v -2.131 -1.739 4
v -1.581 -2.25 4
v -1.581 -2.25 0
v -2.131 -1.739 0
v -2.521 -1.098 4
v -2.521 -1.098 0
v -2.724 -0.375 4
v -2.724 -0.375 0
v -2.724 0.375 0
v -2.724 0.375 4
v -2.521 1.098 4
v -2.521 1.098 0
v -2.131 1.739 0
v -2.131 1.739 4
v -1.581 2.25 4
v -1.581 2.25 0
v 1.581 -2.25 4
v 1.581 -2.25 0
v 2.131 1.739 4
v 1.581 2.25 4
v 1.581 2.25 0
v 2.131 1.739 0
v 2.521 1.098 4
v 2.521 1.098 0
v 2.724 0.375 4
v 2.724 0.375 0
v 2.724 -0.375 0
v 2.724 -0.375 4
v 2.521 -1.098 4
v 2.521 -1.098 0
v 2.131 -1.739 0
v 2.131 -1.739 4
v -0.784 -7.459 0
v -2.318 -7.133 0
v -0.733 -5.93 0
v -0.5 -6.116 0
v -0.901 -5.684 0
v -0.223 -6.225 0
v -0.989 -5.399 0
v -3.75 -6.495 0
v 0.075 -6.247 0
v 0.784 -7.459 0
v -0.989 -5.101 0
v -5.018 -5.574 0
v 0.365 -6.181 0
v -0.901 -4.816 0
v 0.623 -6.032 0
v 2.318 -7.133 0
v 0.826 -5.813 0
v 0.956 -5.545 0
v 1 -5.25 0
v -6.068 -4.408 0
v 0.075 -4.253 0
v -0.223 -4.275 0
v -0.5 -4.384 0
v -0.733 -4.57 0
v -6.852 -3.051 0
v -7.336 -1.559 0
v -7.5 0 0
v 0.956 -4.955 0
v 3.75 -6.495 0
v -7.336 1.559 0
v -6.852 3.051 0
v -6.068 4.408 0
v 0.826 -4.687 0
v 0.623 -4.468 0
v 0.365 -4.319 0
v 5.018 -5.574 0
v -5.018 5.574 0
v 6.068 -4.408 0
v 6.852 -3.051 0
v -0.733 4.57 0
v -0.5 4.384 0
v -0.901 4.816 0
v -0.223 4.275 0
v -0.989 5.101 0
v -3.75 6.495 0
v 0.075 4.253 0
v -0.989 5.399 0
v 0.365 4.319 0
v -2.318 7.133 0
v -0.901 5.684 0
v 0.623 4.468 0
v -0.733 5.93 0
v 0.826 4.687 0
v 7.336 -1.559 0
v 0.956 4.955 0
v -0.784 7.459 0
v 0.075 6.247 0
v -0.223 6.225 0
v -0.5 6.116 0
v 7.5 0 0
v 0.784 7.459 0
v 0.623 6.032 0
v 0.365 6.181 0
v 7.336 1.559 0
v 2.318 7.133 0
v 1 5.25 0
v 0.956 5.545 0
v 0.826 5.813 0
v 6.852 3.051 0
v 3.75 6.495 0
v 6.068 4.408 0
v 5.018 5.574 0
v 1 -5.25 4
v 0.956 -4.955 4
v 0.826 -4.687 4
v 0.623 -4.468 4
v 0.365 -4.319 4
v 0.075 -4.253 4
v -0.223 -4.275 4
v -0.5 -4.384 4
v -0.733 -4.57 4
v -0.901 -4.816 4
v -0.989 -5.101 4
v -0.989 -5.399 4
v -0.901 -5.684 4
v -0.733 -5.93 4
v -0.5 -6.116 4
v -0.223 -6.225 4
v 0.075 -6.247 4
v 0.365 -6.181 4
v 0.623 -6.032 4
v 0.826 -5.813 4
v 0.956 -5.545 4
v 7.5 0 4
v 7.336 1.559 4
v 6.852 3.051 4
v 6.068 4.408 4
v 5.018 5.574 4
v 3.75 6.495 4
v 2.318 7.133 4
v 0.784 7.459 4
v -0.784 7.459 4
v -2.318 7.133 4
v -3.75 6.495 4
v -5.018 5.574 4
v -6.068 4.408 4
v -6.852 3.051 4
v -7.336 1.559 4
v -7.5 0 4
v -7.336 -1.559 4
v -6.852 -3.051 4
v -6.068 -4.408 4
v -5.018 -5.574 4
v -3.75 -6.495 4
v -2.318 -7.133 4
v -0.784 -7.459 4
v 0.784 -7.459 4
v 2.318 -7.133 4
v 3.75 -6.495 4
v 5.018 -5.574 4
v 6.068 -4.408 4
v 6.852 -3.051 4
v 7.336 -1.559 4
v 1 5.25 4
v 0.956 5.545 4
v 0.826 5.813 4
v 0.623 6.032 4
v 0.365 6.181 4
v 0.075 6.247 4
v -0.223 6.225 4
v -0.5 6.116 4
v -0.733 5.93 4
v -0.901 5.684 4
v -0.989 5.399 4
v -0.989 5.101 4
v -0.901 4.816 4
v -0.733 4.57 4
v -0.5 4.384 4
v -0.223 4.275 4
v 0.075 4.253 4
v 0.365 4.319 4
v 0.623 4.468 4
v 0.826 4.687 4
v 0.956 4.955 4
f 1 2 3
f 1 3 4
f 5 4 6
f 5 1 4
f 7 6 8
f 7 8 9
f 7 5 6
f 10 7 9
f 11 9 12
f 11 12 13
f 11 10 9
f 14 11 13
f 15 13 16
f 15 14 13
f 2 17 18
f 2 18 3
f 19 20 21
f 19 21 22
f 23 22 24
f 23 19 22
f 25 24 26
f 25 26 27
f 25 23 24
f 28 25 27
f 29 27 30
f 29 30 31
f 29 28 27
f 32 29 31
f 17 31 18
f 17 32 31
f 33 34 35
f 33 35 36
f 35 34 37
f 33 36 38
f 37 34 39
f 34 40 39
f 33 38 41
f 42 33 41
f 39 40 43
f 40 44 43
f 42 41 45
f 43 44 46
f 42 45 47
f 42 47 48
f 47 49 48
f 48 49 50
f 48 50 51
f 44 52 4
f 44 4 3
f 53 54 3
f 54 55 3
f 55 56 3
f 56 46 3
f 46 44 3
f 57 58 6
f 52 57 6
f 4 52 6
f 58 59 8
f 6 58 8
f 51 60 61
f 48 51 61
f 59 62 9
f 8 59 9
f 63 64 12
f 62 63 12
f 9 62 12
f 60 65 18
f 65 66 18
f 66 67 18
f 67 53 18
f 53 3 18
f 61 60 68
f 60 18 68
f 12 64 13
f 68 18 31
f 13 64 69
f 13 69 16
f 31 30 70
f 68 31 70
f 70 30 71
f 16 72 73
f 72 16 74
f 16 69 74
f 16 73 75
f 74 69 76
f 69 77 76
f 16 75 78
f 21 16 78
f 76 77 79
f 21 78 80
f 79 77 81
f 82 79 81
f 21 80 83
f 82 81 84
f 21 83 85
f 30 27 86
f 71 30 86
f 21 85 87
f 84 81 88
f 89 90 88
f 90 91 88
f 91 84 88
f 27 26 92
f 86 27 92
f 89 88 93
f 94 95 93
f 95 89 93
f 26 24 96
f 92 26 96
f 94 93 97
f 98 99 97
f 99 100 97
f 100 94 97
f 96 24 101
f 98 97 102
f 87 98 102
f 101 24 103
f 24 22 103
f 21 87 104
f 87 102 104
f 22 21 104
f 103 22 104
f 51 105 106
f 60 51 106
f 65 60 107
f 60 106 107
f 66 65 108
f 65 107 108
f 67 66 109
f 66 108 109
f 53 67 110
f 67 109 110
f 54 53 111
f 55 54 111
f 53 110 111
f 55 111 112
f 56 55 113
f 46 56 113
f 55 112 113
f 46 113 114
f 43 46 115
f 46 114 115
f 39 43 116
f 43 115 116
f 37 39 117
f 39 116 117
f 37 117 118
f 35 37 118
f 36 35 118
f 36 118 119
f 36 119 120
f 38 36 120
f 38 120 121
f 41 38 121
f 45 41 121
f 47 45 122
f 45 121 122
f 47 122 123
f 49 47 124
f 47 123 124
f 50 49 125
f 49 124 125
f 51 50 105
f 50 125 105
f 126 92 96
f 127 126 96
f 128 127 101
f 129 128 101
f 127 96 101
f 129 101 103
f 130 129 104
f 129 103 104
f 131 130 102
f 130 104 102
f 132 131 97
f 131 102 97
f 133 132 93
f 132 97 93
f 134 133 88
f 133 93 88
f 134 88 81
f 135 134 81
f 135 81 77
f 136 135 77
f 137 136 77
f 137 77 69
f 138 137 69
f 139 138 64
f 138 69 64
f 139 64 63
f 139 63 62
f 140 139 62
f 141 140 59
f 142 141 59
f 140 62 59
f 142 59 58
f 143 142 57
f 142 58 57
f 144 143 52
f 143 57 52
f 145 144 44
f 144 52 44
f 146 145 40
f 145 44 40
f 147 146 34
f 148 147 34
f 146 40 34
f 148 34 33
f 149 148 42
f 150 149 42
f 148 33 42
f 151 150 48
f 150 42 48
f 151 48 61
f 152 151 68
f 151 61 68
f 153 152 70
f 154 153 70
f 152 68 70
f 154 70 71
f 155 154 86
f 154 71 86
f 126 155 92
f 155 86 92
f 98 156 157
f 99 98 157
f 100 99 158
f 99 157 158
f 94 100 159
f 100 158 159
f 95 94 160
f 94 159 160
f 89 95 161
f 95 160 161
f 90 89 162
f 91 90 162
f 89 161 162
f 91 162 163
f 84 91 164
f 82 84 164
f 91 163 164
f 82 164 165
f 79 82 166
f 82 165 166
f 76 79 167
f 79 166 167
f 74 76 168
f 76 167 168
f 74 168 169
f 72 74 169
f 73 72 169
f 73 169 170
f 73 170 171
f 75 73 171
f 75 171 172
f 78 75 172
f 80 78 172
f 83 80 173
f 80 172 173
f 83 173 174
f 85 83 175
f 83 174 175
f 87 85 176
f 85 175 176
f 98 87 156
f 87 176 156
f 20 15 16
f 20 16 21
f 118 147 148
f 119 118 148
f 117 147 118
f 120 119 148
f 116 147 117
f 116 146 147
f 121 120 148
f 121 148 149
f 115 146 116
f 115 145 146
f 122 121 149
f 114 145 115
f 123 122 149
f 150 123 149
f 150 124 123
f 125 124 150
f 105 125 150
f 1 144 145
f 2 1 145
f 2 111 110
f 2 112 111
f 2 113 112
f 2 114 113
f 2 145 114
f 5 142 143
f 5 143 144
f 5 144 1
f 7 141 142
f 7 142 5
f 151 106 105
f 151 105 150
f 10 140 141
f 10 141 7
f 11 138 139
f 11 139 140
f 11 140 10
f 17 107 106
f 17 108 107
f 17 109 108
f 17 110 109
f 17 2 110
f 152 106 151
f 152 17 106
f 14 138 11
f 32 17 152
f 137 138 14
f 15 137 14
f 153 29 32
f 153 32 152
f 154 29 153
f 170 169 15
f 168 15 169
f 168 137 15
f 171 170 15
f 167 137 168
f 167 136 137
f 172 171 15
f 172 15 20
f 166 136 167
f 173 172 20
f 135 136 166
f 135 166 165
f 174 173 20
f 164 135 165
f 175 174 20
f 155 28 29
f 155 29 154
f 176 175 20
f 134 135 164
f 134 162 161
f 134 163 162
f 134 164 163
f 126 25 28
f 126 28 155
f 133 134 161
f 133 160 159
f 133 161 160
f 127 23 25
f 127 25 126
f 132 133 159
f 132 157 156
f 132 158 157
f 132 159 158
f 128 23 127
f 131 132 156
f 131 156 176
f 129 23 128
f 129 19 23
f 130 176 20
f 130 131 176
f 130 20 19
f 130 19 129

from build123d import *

# Parameters (mm, degrees)
SKETCH_1_R          = 7.5
EXTRUDE_1_DEPTH     = 4
SKETCH_4_R          = 1
CUT_EXTRUDE_2_DEPTH = 4


with BuildPart() as part:
    # Эскиз1 → Бобышка-Вытянуть1 (new body)
    with BuildSketch(Plane.XY):
        Circle(SKETCH_1_R)
    extrude(amount=EXTRUDE_1_DEPTH)

    # Эскиз4 → Вырез-Вытянуть2 (cut)
    with BuildSketch(Plane.XY.offset(4)):
        with Locations((0, 5.25)):
            Circle(SKETCH_4_R)
        with Locations((0, -5.25)):
            Circle(SKETCH_4_R)
        with BuildLine():
            Line((-1.58113883, 2.25), (1.58113883, 2.25))
            ThreePointArc((1.58113883, 2.25), (2.75, 0), (1.58113883, -2.25))
            Line((1.58113883, -2.25), (-1.58113883, -2.25))
            ThreePointArc((-1.58113883, -2.25), (-2.75, 0), (-1.58113883, 2.25))
        make_face()
    extrude(amount=-CUT_EXTRUDE_2_DEPTH, mode=Mode.SUBTRACT)


solid = part.part
